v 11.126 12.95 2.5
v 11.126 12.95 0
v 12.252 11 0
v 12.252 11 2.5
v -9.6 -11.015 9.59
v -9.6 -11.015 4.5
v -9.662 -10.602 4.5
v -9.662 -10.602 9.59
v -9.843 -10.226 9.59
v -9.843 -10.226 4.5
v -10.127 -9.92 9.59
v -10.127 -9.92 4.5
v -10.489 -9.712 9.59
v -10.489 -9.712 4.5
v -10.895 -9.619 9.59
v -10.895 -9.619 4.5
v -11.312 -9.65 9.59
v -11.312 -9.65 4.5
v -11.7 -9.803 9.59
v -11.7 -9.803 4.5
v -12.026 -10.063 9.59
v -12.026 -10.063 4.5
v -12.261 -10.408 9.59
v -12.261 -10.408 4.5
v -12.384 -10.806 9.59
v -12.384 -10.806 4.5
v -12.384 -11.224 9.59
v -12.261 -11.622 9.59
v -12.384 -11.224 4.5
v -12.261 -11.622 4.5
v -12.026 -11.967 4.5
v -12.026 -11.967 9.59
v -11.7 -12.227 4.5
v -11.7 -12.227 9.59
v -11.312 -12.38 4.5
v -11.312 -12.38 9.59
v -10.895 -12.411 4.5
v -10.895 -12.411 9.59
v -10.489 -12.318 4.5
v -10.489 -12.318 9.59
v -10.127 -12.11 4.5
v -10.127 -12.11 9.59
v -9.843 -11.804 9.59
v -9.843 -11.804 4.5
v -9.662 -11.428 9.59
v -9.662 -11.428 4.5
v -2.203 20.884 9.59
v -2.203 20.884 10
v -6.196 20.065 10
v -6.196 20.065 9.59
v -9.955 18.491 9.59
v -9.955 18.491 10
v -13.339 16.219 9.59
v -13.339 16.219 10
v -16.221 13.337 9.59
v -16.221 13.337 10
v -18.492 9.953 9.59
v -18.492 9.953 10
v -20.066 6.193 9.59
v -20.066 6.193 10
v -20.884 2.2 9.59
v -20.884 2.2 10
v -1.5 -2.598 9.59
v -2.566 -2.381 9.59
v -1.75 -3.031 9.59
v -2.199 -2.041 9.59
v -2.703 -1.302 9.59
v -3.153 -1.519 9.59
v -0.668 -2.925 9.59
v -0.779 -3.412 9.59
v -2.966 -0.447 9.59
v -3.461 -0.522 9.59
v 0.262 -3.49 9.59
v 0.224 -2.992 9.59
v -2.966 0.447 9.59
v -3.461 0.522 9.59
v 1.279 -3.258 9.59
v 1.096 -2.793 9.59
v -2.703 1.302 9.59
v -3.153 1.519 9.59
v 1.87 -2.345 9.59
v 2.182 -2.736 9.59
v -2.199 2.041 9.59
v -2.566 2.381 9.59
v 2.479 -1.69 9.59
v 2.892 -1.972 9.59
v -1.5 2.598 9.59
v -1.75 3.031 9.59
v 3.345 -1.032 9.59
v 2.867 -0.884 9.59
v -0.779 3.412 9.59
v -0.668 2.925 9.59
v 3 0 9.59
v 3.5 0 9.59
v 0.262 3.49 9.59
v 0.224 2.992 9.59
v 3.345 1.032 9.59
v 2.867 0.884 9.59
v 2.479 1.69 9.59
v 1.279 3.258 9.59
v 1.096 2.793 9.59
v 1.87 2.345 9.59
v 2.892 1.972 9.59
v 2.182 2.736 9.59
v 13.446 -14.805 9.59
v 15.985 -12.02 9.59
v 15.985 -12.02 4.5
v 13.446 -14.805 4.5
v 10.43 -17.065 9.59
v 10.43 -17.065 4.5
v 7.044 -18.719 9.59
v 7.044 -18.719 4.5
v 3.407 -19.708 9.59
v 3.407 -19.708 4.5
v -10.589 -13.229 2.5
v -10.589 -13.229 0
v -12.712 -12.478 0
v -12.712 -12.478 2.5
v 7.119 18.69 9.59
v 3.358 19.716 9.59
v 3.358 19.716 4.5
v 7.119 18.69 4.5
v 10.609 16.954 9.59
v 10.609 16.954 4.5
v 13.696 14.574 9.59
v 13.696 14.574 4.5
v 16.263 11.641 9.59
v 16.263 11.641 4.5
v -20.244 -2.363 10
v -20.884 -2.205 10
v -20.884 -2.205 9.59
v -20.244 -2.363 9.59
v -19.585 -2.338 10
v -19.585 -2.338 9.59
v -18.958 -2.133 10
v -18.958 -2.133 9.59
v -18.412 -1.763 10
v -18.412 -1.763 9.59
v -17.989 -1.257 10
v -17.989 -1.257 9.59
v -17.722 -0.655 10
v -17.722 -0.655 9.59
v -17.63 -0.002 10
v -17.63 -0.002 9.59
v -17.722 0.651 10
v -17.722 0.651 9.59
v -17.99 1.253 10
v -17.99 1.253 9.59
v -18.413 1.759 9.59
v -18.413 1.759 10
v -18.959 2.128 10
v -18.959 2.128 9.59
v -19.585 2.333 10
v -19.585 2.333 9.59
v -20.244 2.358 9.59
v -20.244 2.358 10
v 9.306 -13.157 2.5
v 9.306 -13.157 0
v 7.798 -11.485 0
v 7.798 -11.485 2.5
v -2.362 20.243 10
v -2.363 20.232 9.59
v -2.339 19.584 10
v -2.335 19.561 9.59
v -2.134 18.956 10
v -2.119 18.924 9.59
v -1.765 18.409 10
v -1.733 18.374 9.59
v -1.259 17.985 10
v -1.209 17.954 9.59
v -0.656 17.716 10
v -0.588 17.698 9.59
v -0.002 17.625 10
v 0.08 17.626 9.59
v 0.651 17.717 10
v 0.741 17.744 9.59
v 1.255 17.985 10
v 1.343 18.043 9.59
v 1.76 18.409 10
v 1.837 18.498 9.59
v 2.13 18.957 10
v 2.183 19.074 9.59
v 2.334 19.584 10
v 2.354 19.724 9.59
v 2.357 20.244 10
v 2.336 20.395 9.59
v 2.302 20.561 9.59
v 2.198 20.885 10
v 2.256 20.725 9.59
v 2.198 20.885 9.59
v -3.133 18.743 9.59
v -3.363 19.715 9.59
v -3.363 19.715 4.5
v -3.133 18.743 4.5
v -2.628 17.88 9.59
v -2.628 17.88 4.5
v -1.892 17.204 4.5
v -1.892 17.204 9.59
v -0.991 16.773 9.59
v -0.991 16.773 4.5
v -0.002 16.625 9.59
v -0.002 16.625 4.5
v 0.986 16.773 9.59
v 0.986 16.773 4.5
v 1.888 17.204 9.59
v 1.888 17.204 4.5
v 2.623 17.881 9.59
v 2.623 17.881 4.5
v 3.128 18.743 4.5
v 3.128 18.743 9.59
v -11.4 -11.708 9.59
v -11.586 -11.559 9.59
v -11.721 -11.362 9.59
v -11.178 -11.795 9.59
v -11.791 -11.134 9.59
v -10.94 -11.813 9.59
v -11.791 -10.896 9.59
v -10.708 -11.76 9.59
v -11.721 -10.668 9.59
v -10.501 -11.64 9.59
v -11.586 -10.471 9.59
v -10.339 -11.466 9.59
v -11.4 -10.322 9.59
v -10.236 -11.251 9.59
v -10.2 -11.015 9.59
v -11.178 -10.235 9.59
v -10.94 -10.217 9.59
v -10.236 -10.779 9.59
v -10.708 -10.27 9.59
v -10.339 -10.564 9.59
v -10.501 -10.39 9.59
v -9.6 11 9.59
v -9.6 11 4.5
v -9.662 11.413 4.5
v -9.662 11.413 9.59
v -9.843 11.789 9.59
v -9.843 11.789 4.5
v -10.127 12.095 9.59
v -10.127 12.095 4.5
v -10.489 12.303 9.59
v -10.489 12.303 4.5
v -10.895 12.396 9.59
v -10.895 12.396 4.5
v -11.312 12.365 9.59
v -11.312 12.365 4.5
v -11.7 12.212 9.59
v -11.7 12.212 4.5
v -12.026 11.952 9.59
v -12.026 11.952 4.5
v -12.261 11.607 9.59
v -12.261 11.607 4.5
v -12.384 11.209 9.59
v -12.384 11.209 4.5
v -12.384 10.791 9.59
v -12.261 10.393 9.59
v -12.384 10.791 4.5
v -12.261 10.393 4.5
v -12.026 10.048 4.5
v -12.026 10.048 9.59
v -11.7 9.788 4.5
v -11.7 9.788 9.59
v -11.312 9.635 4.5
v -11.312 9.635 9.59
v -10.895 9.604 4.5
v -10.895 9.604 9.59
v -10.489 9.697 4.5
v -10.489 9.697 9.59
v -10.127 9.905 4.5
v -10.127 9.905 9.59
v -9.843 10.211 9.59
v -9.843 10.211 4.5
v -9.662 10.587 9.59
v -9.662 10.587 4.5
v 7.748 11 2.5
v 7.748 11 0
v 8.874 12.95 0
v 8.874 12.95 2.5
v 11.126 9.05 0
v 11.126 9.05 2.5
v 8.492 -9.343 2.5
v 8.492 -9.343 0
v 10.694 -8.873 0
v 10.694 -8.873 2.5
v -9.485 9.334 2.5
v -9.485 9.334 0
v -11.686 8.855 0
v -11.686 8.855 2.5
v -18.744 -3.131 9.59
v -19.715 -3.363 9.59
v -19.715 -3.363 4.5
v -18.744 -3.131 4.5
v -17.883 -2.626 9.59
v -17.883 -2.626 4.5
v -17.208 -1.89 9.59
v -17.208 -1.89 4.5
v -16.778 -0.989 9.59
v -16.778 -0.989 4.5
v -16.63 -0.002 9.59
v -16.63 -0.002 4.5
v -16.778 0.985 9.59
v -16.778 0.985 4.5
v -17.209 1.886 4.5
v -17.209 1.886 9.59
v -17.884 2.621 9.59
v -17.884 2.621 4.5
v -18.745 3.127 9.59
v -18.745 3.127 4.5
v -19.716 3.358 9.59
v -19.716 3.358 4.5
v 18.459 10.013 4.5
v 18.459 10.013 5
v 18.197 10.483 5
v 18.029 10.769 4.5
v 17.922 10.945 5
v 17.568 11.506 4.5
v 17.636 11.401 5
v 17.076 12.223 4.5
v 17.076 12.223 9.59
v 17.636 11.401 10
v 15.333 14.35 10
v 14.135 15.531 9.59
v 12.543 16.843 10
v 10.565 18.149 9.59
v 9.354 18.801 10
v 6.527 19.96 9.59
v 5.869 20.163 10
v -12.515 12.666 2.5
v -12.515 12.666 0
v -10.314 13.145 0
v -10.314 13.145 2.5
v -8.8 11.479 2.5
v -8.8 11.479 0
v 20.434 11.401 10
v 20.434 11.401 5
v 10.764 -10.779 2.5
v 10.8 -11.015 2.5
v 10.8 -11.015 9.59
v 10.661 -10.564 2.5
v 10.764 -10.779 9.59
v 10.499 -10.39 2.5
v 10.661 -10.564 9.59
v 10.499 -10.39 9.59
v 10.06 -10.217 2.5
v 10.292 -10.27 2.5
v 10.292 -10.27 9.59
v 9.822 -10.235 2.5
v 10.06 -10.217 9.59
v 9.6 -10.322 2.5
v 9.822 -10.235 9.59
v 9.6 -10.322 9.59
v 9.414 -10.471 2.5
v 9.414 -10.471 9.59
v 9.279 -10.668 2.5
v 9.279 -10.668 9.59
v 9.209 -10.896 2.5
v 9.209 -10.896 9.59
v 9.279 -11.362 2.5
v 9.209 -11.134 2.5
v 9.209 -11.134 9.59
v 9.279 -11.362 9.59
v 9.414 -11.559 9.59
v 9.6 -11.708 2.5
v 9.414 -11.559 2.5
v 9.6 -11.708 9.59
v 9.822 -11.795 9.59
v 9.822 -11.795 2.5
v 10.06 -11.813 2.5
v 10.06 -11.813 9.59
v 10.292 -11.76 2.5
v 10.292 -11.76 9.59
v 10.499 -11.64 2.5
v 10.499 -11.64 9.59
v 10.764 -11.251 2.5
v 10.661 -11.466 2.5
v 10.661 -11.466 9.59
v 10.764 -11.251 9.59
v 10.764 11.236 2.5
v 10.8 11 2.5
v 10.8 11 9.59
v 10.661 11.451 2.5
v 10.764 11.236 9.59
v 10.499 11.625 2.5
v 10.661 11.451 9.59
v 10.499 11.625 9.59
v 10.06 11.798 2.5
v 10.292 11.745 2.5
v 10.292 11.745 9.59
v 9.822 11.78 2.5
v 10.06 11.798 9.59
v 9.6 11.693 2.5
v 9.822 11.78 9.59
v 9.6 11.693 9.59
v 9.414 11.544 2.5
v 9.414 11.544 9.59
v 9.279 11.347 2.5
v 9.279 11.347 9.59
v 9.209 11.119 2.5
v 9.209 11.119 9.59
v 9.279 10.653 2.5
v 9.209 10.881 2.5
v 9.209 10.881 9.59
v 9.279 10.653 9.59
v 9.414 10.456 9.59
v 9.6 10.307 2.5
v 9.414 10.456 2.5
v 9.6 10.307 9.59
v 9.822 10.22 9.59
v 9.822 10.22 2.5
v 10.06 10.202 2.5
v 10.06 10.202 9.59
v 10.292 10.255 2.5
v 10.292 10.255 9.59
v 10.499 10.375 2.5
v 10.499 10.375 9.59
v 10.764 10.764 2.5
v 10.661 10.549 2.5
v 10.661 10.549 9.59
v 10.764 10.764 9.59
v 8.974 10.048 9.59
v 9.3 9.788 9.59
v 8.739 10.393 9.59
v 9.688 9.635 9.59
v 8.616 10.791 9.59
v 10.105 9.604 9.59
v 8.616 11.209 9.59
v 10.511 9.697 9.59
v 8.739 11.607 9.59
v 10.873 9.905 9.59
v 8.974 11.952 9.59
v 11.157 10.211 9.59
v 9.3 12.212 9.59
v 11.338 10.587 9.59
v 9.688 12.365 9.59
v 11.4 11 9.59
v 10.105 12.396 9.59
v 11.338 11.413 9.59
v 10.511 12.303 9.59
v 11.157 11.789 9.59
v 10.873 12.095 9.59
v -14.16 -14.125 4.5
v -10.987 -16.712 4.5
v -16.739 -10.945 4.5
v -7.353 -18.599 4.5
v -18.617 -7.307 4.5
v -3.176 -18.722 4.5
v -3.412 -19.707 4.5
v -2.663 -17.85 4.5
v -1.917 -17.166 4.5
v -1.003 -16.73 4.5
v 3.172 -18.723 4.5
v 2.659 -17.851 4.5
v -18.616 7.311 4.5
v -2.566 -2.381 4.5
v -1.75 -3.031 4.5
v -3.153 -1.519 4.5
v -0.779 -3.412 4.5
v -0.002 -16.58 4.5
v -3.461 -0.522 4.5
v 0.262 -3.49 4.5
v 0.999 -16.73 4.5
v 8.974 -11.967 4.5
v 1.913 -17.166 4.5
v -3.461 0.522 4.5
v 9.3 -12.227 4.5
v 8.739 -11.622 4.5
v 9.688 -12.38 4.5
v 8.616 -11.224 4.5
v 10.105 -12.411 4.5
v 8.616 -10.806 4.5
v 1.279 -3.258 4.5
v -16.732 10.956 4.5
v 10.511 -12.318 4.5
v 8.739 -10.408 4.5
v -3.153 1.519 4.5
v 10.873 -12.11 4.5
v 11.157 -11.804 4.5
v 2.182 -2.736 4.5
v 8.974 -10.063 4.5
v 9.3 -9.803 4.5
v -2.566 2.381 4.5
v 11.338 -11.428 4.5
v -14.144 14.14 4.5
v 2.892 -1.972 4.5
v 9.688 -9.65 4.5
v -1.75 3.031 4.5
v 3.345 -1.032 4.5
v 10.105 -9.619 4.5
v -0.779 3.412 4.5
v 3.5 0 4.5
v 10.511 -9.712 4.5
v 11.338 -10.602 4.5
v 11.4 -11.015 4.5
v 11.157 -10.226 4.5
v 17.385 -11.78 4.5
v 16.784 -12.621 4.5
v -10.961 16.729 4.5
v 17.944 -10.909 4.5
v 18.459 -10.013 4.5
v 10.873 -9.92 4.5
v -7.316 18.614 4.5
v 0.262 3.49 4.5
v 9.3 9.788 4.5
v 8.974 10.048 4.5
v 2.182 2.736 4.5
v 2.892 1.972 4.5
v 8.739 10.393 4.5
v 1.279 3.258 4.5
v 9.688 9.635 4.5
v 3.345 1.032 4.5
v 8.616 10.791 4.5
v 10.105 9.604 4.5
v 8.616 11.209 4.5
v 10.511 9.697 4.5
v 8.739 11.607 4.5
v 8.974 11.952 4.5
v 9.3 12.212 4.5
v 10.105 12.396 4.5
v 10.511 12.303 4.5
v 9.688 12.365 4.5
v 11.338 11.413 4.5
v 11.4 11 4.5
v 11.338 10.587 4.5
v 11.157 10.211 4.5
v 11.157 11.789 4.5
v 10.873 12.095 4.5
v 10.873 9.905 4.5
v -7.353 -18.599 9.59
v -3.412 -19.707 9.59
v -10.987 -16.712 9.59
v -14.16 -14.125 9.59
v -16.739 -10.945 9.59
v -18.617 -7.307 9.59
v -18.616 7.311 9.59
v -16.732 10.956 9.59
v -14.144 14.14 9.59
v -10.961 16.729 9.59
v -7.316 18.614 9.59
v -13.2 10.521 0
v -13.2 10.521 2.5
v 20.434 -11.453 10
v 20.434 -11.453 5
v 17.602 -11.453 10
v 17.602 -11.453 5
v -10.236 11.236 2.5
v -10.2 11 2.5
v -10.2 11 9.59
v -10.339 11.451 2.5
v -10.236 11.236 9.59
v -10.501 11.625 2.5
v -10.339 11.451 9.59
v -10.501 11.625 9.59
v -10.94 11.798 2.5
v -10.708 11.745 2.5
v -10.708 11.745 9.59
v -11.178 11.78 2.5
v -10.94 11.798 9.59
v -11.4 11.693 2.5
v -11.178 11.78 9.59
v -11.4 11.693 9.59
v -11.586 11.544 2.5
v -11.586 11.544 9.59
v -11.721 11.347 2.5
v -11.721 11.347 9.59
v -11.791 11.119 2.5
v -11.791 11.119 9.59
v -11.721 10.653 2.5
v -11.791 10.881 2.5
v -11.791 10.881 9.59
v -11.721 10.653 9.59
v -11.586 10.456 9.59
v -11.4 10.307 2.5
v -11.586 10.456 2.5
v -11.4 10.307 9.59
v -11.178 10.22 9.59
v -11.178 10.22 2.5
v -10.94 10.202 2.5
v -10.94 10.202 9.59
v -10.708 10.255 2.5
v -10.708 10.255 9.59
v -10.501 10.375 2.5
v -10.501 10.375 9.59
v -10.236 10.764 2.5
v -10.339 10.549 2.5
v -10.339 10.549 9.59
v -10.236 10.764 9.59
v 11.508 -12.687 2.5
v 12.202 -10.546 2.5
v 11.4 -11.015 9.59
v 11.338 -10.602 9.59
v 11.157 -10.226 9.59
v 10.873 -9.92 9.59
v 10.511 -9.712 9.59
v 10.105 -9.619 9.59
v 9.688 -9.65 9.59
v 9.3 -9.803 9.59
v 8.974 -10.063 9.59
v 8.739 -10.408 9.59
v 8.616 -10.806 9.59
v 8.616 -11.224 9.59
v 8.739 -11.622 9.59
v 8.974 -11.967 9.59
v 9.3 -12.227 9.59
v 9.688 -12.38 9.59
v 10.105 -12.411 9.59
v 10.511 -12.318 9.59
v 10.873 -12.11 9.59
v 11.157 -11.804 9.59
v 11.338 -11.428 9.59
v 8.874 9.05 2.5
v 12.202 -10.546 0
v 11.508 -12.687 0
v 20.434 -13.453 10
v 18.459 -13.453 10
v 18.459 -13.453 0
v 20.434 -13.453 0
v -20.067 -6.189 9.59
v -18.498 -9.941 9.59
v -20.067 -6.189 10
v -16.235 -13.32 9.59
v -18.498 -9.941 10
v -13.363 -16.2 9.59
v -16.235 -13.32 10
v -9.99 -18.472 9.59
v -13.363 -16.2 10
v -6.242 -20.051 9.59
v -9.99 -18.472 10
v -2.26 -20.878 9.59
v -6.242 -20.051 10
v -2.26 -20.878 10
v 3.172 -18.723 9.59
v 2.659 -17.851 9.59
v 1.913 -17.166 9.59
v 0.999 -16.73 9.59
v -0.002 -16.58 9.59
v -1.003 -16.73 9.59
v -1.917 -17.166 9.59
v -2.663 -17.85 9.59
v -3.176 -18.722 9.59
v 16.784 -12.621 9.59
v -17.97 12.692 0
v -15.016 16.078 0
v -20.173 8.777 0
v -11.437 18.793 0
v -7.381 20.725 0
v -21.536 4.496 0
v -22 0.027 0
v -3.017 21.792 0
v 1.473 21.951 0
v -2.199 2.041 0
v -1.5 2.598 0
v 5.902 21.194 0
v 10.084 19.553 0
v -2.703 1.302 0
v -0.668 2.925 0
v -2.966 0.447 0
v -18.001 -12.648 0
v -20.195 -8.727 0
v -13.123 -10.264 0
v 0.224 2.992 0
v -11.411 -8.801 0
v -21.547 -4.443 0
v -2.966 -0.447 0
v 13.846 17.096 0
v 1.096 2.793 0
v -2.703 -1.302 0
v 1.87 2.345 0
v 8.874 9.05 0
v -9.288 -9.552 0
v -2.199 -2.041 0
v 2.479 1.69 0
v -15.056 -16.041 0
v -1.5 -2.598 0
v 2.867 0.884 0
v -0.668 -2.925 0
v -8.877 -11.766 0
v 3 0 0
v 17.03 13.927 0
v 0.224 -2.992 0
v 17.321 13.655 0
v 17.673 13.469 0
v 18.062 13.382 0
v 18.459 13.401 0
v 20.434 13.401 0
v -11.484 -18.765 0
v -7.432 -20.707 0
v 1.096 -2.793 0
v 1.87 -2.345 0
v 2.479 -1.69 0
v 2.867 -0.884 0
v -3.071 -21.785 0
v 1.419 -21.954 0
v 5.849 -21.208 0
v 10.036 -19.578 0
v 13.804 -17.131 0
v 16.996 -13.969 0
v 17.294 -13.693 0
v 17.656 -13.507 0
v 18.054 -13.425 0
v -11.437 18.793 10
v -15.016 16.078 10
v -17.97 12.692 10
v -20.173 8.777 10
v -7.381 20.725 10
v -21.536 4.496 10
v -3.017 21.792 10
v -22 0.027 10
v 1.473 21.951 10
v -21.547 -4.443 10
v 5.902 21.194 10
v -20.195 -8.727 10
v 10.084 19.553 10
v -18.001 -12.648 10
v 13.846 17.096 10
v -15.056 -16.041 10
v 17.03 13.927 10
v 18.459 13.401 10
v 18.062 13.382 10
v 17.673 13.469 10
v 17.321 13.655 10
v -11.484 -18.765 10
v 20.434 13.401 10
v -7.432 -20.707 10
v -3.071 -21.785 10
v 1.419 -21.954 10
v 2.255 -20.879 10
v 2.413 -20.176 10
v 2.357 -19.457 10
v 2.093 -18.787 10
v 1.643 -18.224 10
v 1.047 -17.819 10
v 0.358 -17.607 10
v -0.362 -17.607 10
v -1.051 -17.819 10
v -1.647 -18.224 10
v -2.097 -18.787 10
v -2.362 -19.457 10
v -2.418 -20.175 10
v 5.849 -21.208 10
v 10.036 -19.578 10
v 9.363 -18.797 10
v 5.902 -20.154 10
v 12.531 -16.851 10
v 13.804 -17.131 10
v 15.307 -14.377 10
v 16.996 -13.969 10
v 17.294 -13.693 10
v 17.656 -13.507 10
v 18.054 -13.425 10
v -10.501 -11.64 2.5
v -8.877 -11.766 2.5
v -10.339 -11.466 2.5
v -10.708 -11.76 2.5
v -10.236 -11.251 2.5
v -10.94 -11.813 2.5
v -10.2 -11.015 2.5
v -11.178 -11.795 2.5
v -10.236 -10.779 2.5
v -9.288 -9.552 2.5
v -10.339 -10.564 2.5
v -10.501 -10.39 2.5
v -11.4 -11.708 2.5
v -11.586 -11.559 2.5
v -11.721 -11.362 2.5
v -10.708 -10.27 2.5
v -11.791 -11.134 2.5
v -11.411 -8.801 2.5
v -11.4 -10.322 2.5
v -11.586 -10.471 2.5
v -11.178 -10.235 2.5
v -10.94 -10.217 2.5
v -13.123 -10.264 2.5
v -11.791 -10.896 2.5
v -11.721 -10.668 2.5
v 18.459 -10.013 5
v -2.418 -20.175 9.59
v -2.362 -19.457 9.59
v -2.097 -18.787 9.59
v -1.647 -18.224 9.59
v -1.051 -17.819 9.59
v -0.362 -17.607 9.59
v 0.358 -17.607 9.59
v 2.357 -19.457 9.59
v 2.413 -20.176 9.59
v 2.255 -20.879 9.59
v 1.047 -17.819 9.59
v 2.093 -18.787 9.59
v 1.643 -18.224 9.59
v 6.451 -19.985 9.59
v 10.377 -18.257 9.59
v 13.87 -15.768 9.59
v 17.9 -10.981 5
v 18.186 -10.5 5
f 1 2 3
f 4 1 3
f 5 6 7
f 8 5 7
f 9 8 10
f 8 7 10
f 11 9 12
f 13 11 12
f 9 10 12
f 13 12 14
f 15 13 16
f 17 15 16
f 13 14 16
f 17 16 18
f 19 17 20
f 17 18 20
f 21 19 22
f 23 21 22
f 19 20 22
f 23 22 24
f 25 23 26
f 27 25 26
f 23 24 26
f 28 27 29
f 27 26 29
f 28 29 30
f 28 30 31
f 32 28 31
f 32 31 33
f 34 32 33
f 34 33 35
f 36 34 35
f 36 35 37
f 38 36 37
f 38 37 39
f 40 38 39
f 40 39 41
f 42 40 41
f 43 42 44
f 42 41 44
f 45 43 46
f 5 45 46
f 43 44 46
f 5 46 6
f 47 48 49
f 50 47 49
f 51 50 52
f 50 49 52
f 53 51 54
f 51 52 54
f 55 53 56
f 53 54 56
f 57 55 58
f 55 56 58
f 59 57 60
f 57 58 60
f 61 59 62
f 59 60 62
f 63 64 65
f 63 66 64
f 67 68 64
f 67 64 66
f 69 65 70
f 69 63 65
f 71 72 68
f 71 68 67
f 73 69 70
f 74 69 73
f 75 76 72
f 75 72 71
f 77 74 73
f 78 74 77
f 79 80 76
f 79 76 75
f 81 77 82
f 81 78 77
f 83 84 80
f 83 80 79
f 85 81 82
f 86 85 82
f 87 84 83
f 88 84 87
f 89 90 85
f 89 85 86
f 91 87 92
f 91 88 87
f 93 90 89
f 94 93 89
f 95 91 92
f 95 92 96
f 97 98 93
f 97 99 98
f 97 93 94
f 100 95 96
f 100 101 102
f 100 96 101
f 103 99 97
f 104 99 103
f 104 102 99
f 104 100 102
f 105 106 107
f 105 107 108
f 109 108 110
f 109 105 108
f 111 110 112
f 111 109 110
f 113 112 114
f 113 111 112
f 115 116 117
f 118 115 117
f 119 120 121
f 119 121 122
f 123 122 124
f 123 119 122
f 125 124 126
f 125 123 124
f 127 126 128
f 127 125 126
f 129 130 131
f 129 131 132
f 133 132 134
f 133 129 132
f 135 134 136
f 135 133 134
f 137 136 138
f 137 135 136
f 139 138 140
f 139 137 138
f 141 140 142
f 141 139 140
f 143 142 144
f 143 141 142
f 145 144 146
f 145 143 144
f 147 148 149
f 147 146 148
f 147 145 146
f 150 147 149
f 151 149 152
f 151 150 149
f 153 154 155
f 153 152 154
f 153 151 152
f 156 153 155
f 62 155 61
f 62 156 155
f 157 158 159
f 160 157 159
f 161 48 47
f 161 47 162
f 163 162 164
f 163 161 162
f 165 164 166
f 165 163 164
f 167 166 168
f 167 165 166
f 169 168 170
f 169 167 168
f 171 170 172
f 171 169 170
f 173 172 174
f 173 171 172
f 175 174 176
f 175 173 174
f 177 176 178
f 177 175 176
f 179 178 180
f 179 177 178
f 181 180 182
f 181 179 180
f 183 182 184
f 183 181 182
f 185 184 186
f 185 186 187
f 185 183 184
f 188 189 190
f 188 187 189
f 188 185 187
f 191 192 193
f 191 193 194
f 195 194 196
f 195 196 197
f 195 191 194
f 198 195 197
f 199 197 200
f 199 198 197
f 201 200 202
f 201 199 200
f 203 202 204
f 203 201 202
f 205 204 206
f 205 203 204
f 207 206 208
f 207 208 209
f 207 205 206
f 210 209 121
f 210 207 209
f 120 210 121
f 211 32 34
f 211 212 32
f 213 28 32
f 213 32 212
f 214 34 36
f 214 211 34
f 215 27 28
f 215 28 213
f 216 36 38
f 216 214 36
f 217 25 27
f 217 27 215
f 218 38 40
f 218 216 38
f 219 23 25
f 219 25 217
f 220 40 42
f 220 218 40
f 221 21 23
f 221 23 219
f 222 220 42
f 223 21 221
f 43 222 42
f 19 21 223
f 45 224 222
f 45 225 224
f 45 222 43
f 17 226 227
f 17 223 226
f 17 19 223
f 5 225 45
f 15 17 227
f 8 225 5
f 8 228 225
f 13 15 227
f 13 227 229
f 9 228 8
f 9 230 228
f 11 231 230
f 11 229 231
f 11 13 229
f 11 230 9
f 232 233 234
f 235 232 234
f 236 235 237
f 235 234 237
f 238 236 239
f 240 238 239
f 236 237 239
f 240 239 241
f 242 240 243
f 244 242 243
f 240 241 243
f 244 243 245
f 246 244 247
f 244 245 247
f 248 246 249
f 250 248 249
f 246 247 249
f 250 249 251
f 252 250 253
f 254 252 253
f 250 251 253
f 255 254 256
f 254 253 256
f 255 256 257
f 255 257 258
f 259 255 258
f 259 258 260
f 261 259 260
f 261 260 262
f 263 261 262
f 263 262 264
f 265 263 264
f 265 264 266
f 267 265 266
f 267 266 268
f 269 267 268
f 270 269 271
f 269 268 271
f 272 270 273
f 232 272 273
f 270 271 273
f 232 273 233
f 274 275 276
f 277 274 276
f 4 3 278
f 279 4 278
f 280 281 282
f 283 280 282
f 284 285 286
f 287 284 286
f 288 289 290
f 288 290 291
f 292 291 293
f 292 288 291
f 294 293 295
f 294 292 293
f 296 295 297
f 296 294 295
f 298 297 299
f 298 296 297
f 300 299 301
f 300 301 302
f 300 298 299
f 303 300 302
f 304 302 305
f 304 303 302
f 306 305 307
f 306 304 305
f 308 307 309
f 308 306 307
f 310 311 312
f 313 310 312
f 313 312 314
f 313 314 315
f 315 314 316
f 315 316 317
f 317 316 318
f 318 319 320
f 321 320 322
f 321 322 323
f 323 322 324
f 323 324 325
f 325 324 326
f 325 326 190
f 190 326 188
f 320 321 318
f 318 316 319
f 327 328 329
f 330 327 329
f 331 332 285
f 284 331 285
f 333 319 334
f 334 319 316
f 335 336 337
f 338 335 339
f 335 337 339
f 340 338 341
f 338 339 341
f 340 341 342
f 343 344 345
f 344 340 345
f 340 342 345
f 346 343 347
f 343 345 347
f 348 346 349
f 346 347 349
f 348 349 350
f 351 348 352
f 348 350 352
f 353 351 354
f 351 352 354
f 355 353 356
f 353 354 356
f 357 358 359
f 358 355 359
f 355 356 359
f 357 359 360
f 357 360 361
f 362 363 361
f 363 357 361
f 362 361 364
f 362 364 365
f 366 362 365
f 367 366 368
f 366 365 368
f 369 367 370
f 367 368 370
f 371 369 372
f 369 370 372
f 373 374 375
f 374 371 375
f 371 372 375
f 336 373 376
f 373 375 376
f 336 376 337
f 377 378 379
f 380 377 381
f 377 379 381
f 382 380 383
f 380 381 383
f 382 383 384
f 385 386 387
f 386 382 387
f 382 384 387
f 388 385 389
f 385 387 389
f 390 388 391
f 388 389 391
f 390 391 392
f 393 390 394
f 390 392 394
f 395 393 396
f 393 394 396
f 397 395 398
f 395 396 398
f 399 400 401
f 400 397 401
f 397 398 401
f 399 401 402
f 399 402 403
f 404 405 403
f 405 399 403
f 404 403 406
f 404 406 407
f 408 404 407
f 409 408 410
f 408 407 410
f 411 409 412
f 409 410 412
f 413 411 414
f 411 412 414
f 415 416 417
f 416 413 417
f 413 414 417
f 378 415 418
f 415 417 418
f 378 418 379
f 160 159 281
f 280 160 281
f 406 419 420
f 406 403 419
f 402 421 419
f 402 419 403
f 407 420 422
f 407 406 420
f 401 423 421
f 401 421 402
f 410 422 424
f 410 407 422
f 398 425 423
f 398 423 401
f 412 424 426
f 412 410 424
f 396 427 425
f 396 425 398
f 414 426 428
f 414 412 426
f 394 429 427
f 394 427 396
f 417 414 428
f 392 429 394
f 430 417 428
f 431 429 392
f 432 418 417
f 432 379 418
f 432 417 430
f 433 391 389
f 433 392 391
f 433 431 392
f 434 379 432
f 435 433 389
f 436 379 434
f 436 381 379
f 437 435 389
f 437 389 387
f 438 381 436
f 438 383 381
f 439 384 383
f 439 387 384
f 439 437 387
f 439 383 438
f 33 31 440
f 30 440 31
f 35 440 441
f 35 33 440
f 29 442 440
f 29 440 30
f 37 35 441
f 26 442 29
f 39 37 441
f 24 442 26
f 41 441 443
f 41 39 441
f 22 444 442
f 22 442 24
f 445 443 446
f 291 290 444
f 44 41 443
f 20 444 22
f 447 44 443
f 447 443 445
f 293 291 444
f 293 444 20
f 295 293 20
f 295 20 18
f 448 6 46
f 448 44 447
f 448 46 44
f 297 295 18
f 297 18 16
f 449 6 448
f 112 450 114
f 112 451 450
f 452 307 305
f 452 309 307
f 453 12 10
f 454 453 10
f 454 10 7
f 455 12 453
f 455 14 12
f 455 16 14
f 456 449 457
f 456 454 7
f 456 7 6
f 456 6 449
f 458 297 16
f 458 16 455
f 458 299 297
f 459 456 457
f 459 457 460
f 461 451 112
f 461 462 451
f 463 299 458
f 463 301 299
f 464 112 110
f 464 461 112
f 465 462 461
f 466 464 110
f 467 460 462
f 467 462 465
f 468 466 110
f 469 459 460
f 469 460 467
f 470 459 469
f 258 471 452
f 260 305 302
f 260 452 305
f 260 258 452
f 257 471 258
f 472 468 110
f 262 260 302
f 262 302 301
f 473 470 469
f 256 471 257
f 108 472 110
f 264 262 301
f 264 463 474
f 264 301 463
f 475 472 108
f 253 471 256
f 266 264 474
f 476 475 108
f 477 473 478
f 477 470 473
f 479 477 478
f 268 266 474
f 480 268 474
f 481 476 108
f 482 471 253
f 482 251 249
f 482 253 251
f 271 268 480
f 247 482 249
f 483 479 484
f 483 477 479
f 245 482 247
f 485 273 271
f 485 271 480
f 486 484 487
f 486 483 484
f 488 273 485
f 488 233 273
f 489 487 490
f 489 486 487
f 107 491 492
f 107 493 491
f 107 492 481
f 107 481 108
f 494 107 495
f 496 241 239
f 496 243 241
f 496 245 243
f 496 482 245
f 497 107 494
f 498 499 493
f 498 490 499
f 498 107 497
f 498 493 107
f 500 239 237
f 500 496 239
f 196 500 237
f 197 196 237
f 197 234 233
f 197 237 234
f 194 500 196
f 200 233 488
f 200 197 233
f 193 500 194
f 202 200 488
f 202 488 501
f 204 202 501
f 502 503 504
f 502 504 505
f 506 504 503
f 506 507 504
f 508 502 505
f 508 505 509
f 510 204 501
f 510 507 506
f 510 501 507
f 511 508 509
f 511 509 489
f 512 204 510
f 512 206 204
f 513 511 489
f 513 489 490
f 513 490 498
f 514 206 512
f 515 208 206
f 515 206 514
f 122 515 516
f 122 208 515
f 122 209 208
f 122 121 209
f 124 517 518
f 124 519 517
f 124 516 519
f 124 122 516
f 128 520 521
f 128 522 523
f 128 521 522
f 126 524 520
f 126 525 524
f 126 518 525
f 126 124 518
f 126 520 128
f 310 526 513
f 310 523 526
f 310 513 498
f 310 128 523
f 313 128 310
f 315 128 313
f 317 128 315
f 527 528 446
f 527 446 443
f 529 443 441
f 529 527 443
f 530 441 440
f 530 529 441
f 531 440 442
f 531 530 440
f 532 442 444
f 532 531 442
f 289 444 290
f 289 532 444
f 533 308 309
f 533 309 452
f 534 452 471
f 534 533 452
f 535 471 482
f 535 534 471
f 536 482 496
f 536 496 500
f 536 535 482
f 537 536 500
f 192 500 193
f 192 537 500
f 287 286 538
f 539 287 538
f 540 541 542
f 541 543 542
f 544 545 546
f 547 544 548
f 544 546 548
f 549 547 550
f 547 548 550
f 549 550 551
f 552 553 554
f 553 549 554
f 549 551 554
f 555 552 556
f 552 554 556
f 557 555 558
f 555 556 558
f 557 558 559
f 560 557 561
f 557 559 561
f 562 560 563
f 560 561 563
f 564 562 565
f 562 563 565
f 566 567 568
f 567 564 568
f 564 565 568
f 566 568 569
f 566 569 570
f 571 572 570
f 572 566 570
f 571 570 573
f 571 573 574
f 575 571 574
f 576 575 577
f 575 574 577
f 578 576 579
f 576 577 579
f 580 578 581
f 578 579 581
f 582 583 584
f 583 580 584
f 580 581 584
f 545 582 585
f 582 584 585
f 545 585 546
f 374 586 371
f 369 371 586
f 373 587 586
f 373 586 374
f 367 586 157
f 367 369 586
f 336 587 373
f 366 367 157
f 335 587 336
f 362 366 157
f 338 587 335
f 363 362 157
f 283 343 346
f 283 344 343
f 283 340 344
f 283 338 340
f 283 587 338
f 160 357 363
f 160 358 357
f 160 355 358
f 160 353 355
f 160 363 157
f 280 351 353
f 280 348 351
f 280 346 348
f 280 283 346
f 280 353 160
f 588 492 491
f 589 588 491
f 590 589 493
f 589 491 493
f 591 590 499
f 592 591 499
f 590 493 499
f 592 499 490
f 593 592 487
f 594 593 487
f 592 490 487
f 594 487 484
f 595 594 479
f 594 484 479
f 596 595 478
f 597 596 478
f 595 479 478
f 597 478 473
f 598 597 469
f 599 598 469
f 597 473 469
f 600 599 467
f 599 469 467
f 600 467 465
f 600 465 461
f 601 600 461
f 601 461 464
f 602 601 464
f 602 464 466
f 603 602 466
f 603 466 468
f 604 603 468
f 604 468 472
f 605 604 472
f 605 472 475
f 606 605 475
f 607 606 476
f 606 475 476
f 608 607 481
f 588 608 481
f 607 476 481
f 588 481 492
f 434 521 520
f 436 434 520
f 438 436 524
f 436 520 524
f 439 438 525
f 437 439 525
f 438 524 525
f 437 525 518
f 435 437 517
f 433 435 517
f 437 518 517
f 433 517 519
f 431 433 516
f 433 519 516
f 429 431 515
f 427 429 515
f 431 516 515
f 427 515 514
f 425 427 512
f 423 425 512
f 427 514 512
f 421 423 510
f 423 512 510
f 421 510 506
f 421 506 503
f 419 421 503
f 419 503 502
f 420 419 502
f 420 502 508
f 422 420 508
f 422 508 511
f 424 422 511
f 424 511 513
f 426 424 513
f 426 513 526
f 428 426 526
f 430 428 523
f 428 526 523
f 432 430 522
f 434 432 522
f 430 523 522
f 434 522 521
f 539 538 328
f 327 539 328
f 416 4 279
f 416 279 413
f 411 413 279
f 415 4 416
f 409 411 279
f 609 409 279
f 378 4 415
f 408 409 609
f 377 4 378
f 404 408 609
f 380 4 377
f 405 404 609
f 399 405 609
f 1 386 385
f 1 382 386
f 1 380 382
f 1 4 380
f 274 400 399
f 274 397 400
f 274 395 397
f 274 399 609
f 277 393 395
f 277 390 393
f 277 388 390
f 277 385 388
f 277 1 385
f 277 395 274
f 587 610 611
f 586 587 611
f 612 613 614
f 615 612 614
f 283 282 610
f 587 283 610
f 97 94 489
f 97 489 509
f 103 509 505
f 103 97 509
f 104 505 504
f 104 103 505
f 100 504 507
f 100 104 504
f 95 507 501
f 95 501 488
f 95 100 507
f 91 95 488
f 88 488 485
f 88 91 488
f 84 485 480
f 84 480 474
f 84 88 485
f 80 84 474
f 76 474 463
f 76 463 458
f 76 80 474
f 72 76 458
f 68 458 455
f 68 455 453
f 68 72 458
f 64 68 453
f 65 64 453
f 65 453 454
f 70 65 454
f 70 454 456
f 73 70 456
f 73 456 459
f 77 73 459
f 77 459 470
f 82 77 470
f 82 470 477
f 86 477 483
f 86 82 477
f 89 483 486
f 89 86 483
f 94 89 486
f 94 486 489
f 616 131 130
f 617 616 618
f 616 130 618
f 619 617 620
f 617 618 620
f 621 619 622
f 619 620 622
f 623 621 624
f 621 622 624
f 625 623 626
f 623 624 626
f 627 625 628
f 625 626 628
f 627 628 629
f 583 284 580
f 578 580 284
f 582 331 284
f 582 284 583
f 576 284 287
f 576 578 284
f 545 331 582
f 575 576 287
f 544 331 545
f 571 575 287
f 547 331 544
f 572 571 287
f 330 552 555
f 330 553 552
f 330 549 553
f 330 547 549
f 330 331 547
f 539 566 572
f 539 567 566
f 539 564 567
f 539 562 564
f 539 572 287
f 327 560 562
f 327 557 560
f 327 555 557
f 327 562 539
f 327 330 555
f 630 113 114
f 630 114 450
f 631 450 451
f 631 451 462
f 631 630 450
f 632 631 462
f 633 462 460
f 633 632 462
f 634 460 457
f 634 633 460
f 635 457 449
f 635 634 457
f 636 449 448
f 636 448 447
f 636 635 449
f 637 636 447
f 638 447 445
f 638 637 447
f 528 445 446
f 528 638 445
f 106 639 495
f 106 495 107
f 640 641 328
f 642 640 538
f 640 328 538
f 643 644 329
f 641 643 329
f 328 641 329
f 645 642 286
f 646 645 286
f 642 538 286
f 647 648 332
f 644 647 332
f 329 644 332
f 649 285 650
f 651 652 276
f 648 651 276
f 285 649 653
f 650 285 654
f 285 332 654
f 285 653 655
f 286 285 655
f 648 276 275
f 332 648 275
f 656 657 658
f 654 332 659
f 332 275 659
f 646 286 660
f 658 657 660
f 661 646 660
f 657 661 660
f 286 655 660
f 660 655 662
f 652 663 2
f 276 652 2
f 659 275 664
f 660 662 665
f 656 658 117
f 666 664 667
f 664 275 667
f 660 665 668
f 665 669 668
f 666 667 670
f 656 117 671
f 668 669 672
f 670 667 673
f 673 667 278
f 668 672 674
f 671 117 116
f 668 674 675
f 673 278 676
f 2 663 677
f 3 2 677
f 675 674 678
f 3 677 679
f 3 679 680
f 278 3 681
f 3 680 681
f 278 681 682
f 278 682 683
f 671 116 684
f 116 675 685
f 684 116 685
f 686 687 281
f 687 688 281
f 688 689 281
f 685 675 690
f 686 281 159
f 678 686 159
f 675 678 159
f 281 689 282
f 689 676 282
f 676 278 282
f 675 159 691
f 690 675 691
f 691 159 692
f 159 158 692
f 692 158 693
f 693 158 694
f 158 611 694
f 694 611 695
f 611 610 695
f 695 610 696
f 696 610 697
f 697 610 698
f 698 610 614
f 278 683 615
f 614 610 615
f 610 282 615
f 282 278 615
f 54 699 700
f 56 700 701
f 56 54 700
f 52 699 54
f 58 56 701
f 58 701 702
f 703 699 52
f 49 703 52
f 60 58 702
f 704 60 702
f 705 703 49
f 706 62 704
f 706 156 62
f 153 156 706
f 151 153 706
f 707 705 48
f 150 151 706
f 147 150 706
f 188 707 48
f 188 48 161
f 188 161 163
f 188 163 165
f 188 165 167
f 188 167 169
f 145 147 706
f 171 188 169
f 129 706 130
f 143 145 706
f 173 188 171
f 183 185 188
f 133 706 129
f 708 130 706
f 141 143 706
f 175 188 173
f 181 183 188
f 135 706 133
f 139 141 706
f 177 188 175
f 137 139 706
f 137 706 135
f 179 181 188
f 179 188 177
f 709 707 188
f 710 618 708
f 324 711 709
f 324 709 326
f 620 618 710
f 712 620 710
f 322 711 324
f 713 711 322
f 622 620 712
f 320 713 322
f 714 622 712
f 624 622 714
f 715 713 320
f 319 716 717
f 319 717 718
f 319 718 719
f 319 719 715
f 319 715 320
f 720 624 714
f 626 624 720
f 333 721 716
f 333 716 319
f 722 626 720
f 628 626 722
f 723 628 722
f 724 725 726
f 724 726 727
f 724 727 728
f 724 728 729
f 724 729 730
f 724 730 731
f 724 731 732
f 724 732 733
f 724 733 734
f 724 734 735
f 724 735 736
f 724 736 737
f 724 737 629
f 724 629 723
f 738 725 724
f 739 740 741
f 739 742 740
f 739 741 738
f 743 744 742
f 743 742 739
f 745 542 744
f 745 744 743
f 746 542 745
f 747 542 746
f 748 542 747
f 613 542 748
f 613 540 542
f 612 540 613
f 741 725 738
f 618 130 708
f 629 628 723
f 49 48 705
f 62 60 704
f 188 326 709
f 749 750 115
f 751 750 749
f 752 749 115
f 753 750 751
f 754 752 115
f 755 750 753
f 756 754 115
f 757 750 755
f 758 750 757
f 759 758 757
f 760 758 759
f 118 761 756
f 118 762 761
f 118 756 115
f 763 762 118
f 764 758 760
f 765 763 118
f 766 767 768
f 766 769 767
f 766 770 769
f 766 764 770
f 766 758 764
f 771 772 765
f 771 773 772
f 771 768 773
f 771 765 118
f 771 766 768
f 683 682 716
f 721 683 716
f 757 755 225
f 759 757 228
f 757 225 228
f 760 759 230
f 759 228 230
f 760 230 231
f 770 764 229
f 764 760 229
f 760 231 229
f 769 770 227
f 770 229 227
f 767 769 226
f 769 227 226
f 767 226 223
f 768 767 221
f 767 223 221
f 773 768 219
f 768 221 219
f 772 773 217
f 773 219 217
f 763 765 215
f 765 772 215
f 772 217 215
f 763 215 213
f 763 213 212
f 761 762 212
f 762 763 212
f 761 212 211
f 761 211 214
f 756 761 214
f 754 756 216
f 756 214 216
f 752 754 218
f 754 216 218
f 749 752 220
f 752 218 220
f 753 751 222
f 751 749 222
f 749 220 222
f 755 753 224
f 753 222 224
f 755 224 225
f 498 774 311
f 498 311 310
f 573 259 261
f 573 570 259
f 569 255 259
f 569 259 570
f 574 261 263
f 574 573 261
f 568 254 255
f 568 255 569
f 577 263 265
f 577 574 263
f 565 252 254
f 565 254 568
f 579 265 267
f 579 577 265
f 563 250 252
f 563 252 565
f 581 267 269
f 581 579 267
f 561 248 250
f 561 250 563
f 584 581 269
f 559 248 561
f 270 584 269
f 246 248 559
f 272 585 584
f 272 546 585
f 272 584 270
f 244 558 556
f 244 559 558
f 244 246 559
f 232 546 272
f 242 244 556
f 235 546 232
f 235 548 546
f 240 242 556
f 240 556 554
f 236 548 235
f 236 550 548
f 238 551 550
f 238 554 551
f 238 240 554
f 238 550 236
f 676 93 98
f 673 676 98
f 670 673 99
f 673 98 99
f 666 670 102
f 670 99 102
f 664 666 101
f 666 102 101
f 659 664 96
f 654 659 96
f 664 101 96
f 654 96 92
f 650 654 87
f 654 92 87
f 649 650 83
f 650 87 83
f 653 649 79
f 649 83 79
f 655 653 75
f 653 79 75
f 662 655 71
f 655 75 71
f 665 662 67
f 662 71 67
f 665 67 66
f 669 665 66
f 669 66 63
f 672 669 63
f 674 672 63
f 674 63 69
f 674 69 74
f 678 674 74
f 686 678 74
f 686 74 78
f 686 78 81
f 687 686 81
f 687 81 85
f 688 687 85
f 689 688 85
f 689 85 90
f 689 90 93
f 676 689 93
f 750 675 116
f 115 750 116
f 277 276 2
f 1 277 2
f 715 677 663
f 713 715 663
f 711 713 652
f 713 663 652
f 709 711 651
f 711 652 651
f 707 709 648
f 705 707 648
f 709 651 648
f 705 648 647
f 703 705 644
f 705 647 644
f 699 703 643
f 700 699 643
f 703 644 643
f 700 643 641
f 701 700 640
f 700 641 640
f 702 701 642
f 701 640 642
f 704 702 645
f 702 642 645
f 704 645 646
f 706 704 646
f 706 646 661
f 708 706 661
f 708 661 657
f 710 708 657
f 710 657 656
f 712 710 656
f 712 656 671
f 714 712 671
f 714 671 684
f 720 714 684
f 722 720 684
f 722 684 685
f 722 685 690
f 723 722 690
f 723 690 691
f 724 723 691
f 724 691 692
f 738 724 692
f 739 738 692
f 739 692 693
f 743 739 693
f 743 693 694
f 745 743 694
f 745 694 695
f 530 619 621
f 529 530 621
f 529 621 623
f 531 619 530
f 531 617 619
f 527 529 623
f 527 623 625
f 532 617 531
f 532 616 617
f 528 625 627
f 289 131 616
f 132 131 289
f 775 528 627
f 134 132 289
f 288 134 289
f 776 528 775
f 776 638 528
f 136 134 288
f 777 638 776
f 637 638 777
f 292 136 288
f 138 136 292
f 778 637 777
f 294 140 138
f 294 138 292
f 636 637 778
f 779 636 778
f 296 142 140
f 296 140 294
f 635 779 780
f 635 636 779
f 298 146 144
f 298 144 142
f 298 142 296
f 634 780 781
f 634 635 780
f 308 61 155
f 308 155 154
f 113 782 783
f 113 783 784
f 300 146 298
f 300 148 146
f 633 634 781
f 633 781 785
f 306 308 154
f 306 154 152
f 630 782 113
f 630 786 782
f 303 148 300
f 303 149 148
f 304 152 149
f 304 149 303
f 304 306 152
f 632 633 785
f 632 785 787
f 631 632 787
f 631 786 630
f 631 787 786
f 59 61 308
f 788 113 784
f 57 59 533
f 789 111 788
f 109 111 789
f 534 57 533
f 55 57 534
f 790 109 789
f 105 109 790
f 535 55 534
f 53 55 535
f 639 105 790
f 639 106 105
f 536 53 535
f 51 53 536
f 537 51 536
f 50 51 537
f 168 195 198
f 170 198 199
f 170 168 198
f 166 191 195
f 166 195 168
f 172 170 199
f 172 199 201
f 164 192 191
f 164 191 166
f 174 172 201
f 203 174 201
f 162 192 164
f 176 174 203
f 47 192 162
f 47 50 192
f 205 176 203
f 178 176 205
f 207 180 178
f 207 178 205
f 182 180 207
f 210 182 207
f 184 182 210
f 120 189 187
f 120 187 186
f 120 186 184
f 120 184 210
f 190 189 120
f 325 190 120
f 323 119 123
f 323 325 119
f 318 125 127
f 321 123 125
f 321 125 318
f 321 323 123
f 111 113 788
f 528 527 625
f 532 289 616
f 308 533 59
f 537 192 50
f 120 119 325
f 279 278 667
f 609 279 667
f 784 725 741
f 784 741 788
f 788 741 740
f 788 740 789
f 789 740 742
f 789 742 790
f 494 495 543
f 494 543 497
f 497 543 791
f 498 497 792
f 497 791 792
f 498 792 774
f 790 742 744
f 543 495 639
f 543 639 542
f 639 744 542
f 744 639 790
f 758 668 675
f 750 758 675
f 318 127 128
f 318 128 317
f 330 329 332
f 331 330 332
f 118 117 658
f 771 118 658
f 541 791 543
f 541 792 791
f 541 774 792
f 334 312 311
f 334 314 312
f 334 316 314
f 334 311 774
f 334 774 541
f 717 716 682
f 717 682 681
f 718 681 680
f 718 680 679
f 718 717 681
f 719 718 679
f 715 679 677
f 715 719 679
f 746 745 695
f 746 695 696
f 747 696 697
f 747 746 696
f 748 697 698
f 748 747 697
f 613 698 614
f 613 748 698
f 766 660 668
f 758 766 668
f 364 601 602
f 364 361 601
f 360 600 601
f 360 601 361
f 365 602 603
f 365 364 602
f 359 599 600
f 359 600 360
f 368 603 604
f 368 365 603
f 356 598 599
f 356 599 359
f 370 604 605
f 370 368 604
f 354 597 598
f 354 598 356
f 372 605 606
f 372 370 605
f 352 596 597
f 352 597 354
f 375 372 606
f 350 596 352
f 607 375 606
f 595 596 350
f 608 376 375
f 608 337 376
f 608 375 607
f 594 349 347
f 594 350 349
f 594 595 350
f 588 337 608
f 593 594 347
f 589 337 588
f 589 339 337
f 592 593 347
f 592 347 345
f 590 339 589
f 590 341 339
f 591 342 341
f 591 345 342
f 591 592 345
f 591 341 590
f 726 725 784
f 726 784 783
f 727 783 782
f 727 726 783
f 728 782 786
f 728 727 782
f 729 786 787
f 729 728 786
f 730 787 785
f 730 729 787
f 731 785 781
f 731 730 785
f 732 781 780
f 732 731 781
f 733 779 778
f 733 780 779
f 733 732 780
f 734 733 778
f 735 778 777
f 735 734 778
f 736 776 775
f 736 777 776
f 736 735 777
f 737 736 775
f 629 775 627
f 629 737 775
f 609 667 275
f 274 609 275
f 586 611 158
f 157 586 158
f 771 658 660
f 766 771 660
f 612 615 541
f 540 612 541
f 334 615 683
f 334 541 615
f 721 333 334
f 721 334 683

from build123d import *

# Parameters (mm, degrees)
SKETCH2_R                 = 22
BOSS_EXTRUDE1_DEPTH       = 10
SKETCH3_R                 = 21
CUT_EXTRUDE2_DEPTH        = 5.5
SKETCH4_R                 = 1.4
SKETCH4_R_2               = 0.8
BOSS_EXTRUDE2_DEPTH       = 5.09
SKETCH5_R                 = 3
CUT_EXTRUDE3_DEPTH        = 13
BOSS_EXTRUDE3_START       = 5.09
SKETCH6_R                 = 3.5
SKETCH6_R_2               = 3
BOSS_EXTRUDE3_DEPTH       = 5.09
SKETCH18_R                = 0.8
CUT_EXTRUDE7_DEPTH        = 33.557151288
SKETCH20_W                = 10.090622296
SKETCH20_H                = 22.853546686
CUT_EXTRUDE8_DEPTH        = 5
BOSS_EXTRUDE12_DEPTH      = 0.5
BOSS_EXTRUDE12_DEPTH_BACK = 2
FILLET3_R                 = 1.5
CUT_EXTRUDE9_REACH        = 34.68
SKETCH25_W                = 14.266365092
SKETCH25_H                = 28.452518254
BOSS_EXTRUDE14_START      = 5.5
BOSS_EXTRUDE14_DEPTH      = 5.5
BOSS_EXTRUDE15_START      = 5.09
BOSS_EXTRUDE15_DEPTH      = 5.09
SKETCH36_R                = 0.8
CUT_EXTRUDE10_DEPTH       = 2.5


with BuildPart() as part:
    # Sketch2 → Boss-Extrude1 (new body)
    with BuildSketch(Plane.XY):
        Circle(SKETCH2_R)
    extrude(amount=BOSS_EXTRUDE1_DEPTH)

    # Sketch3 → Cut-Extrude2 (cut)
    with BuildSketch(Plane.XY.offset(10)):
        Circle(SKETCH3_R)
    extrude(amount=-CUT_EXTRUDE2_DEPTH, mode=Mode.SUBTRACT)

    # Sketch4 → Boss-Extrude2 (add)
    # profile 1 of 4: a face of its own
    with BuildSketch(Plane.XY.offset(4.5)):
        with Locations((-11, 11)):
            Circle(SKETCH4_R)
        with Locations((-11, 11)):
            Circle(SKETCH4_R_2, mode=Mode.SUBTRACT)
    # profile 2 of 4: a face of its own
    with BuildSketch(Plane.XY.offset(4.5)):
        with Locations((10, 11)):
            Circle(SKETCH4_R)
        with Locations((10, 11)):
            Circle(SKETCH4_R_2, mode=Mode.SUBTRACT)
    # profile 3 of 4: a face of its own
    with BuildSketch(Plane.XY.offset(4.5)):
        with Locations((10, -11.015029648)):
            Circle(SKETCH4_R)
        with Locations((10, -11.015029648)):
            Circle(SKETCH4_R_2, mode=Mode.SUBTRACT)
    # profile 4 of 4: a face of its own
    with BuildSketch(Plane.XY.offset(4.5)):
        with Locations((-11, -11.015029648)):
            Circle(SKETCH4_R)
        with Locations((-11, -11.015029648)):
            Circle(SKETCH4_R_2, mode=Mode.SUBTRACT)
    extrude(amount=BOSS_EXTRUDE2_DEPTH)

    # Sketch5 → Cut-Extrude3 (cut)
    with BuildSketch(Plane.XY.offset(4.5)):
        Circle(SKETCH5_R)
    extrude(amount=-CUT_EXTRUDE3_DEPTH, mode=Mode.SUBTRACT)

    # Sketch6 → Boss-Extrude3 (add)
    with BuildSketch(Plane.XY.offset(4.5).offset(BOSS_EXTRUDE3_START)):
        Circle(SKETCH6_R)
        Circle(SKETCH6_R_2, mode=Mode.SUBTRACT)
    extrude(amount=-BOSS_EXTRUDE3_DEPTH)

    # Sketch18 → Cut-Extrude7 (cut, through all)
    with BuildSketch(Plane.XY.offset(9.59)):
        with Locations((-11, 11)):
            Circle(SKETCH18_R)
        with Locations((10, 11)):
            Circle(SKETCH18_R)
        with Locations((10, -11.015029648)):
            Circle(SKETCH18_R)
        with Locations((-11, -11.015029648)):
            Circle(SKETCH18_R)
    extrude(amount=-CUT_EXTRUDE7_DEPTH, mode=Mode.SUBTRACT)

    # Sketch20 → Cut-Extrude8 (cut)
    with BuildSketch(Plane.XY.offset(10)):
        with Locations((22.416150926, -0.026114621)):
            Rectangle(SKETCH20_W, SKETCH20_H)
    extrude(amount=-CUT_EXTRUDE8_DEPTH, mode=Mode.SUBTRACT)

    # Sketch24 → Boss-Extrude12 (add, two sides: drawn at the far end of the back side and taken through both)
    with BuildSketch(Plane(origin=(20.459151462, 0, 0), x_dir=(0, 0, -1), z_dir=(1, 0, 0)).offset(-BOSS_EXTRUDE12_DEPTH_BACK)):
        Polygon((-10, 11.400658722), (-5, 11.400658722), (-5, -11.452887964), (-10, -11.452887964), (-10, -13.452887964), (0, -13.452887964), (0, 13.400658722), (-10, 13.400658722), align=None)
    extrude(amount=BOSS_EXTRUDE12_DEPTH + BOSS_EXTRUDE12_DEPTH_BACK)

    # Fillet3
    # the kernel refuses this fillet: 1.5 mm, written as the material it adds along each edge
    with BuildSketch(Plane(origin=(18.459151462, -11.96911556, 10), x_dir=(-0.5904449589770525, -0.8070779085184941, 0), z_dir=(0, 0, -1))) as fillet3_piece_1:
        with BuildLine():
            CenterArc((2.562692726, -1.497618907), FILLET3_R, 93.228774065, 62.292501853)
            Line((1.197519929, -0.876085936), (1.170216473, -0.863655277))
            ThreePointArc((1.170216473, -0.863655277), (0.581046616, -0.462255305), (-0.017713349, -0.024212337))
            Line((-0.017713349, -0.024212337), (0.001689688, 0.029952378))
            ThreePointArc((0.001689688, 0.029952378), (1.239104175, -0.004922699), (2.476518663, 0.029952378))
            Line((2.476518663, 0.029952378), (2.47820835, 0))
        make_face()
    extrude(amount=10)
    with BuildSketch(Plane(origin=(18.459151462, 11.96911556, 10), x_dir=(0, 1, 0), z_dir=(0, 0, -1))) as fillet3_piece_2:
        with BuildLine():
            CenterArc((2.907499122, -0.267495804), FILLET3_R, 169.727466674, 60.997217104)
            Line((1.957927972, -1.428665314), (1.938936549, -1.451888704))
            ThreePointArc((1.938936549, -1.451888704), (0.980970205, -0.711583215), (-0.016321521, -0.02517157))
            Line((-0.016321521, -0.02517157), (0, 0.03))
            ThreePointArc((0, 0.03), (0.715771581, 0.03), (1.402024043, 0.005349916))
            Line((1.402024043, 0.005349916), (1.431543163, 0))
        make_face()
    extrude(amount=10)

    # Sketch25 → Cut-Extrude9 (cut, up to next)
    with BuildSketch(Plane.XY.offset(10), mode=Mode.PRIVATE) as cut_extrude9_sk1:
        with Locations((27.566848105, 0.101683084)):
            Rectangle(SKETCH25_W, SKETCH25_H)
    cut_extrude9_tool1 = extrude(cut_extrude9_sk1.sketch, amount=-CUT_EXTRUDE9_REACH, mode=Mode.PRIVATE) & part.part
    add(cut_extrude9_tool1.solids().sort_by_distance((27.566848, 0.101683, 10))[0], mode=Mode.SUBTRACT)

    # Sketch30 → Boss-Extrude14 (add)
    with BuildSketch(Plane.XY.offset(4.5).offset(BOSS_EXTRUDE14_START)):
        with BuildLine():
            ThreePointArc((2.255465854, -20.878526619), (-0.002066694, -17.580176404), (-2.260374676, -20.877995745))
            ThreePointArc((-2.260374676, -20.877995745), (-0.002468723, -20.999999855), (2.255465854, -20.878526619))
        make_face()
        with BuildLine():
            ThreePointArc((-2.203022296, 20.884125377), (-0.002233305, 17.624620846), (2.197729558, 20.884683019))
            ThreePointArc((2.197729558, 20.884683019), (-0.002661017, 20.999999831), (-2.203022296, 20.884125377))
        make_face()
        with BuildLine():
            ThreePointArc((-20.883881485, -2.205333104), (-17.630224728, -0.00211959), (-20.884411153, 2.200311519))
            ThreePointArc((-20.884411153, 2.200311519), (-20.999999848, -0.002524721), (-20.883881485, -2.205333104))
        make_face()
    extrude(amount=-BOSS_EXTRUDE14_DEPTH)

    # Sketch33 → Boss-Extrude15 (add)
    with BuildSketch(Plane.XY.offset(4.5).offset(BOSS_EXTRUDE15_START)):
        with BuildLine():
            Line((16.263091014, 11.640956604), (17.076245565, 12.223004435))
            ThreePointArc((17.076245565, 12.223004435), (10.565400997, 18.148617076), (2.197729558, 20.884683019))
            ThreePointArc((2.197729558, 20.884683019), (2.280216576, 20.643620919), (2.336378022, 20.395103458))
            ThreePointArc((2.336378022, 20.395103458), (-0.256894976, 17.638295394), (-2.203022296, 20.884125377))
            ThreePointArc((-2.203022296, 20.884125377), (-14.850206089, 14.848278658), (-20.884411153, 2.200311519))
            ThreePointArc((-20.884411153, 2.200311519), (-17.630224728, -0.00211959), (-20.883881485, -2.205333104))
            ThreePointArc((-20.883881485, -2.205333104), (-14.868800585, -14.82965843), (-2.260374676, -20.877995745))
            ThreePointArc((-2.260374676, -20.877995745), (-0.002066694, -17.580176404), (2.255465854, -20.878526619))
            ThreePointArc((2.255465854, -20.878526619), (10.376578748, -18.257234552), (16.784176211, -12.621070831))
            Line((16.784176211, -12.621070831), (15.984929724, -12.020067458))
            ThreePointArc((15.984929724, -12.020067458), (10.430037734, -17.065002575), (3.406904238, -19.707688944))
            ThreePointArc((3.406904238, -19.707688944), (-0.001949136, -16.580176411), (-3.411537746, -19.70688738))
            ThreePointArc((-3.411537746, -19.70688738), (-14.159639755, -14.1246098), (-19.715277269, -3.362713518))
            ThreePointArc((-19.715277269, -3.362713518), (-16.630224735, -0.001999366), (-19.716085262, 3.35797289))
            ThreePointArc((-19.716085262, 3.35797289), (-14.144029066, 14.140241928), (-3.36325256, 19.71518532))
            ThreePointArc((-3.36325256, 19.71518532), (-0.00210659, 16.624620854), (3.358256029, 19.716037037))
            ThreePointArc((3.358256029, 19.716037037), (10.609007774, 16.954319628), (16.263091014, 11.640956604))
        make_face()
    extrude(amount=-BOSS_EXTRUDE15_DEPTH)

    # Sketch36 → Cut-Extrude10 (cut)
    # profile 1 of 4: a face of its own
    with BuildSketch(Plane(origin=(0, 0, 0), x_dir=(-1, 0, 0), z_dir=(0, 0, -1))):
        Polygon((-7.74833395, 11), (-8.874166975, 12.95), (-11.125833025, 12.95), (-12.25166605, 11), (-11.125833025, 9.05), (-8.874166975, 9.05), align=None)
        with Locations((-10, 11)):
            Circle(SKETCH36_R, mode=Mode.SUBTRACT)
    # profile 2 of 4: a face of its own
    with BuildSketch(Plane(origin=(0, 0, 0), x_dir=(-1, 0, 0), z_dir=(0, 0, -1))):
        Polygon((12.514649012, 12.666084743), (10.314452793, 13.144766893), (8.799803782, 11.47868215), (9.485350988, 9.333915257), (11.685547207, 8.855233107), (13.200196218, 10.52131785), align=None)
        with Locations((11, 11)):
            Circle(SKETCH36_R, mode=Mode.SUBTRACT)
    # profile 3 of 4: a face of its own
    with BuildSketch(Plane(origin=(0, 0, 0), x_dir=(-1, 0, 0), z_dir=(0, 0, -1))):
        Polygon((13.122597825, -10.263645278), (11.41058096, -8.801113824), (9.287983135, -9.552498195), (8.877402175, -11.766414018), (10.58941904, -13.228945472), (12.712016865, -12.477561101), align=None)
        with Locations((11, -11.015029648)):
            Circle(SKETCH36_R, mode=Mode.SUBTRACT)
    # profile 4 of 4: a face of its own
    with BuildSketch(Plane(origin=(0, 0, 0), x_dir=(-1, 0, 0), z_dir=(0, 0, -1))):
        Polygon((-8.492299155, -9.342654641), (-10.694468818, -8.873134912), (-12.202169663, -10.545509919), (-11.507700845, -12.687404655), (-9.305531182, -13.156924384), (-7.797830337, -11.484549377), align=None)
        with Locations((-10, -11.015029648)):
            Circle(SKETCH36_R, mode=Mode.SUBTRACT)
    extrude(amount=-CUT_EXTRUDE10_DEPTH, mode=Mode.SUBTRACT)


solid = part.part
